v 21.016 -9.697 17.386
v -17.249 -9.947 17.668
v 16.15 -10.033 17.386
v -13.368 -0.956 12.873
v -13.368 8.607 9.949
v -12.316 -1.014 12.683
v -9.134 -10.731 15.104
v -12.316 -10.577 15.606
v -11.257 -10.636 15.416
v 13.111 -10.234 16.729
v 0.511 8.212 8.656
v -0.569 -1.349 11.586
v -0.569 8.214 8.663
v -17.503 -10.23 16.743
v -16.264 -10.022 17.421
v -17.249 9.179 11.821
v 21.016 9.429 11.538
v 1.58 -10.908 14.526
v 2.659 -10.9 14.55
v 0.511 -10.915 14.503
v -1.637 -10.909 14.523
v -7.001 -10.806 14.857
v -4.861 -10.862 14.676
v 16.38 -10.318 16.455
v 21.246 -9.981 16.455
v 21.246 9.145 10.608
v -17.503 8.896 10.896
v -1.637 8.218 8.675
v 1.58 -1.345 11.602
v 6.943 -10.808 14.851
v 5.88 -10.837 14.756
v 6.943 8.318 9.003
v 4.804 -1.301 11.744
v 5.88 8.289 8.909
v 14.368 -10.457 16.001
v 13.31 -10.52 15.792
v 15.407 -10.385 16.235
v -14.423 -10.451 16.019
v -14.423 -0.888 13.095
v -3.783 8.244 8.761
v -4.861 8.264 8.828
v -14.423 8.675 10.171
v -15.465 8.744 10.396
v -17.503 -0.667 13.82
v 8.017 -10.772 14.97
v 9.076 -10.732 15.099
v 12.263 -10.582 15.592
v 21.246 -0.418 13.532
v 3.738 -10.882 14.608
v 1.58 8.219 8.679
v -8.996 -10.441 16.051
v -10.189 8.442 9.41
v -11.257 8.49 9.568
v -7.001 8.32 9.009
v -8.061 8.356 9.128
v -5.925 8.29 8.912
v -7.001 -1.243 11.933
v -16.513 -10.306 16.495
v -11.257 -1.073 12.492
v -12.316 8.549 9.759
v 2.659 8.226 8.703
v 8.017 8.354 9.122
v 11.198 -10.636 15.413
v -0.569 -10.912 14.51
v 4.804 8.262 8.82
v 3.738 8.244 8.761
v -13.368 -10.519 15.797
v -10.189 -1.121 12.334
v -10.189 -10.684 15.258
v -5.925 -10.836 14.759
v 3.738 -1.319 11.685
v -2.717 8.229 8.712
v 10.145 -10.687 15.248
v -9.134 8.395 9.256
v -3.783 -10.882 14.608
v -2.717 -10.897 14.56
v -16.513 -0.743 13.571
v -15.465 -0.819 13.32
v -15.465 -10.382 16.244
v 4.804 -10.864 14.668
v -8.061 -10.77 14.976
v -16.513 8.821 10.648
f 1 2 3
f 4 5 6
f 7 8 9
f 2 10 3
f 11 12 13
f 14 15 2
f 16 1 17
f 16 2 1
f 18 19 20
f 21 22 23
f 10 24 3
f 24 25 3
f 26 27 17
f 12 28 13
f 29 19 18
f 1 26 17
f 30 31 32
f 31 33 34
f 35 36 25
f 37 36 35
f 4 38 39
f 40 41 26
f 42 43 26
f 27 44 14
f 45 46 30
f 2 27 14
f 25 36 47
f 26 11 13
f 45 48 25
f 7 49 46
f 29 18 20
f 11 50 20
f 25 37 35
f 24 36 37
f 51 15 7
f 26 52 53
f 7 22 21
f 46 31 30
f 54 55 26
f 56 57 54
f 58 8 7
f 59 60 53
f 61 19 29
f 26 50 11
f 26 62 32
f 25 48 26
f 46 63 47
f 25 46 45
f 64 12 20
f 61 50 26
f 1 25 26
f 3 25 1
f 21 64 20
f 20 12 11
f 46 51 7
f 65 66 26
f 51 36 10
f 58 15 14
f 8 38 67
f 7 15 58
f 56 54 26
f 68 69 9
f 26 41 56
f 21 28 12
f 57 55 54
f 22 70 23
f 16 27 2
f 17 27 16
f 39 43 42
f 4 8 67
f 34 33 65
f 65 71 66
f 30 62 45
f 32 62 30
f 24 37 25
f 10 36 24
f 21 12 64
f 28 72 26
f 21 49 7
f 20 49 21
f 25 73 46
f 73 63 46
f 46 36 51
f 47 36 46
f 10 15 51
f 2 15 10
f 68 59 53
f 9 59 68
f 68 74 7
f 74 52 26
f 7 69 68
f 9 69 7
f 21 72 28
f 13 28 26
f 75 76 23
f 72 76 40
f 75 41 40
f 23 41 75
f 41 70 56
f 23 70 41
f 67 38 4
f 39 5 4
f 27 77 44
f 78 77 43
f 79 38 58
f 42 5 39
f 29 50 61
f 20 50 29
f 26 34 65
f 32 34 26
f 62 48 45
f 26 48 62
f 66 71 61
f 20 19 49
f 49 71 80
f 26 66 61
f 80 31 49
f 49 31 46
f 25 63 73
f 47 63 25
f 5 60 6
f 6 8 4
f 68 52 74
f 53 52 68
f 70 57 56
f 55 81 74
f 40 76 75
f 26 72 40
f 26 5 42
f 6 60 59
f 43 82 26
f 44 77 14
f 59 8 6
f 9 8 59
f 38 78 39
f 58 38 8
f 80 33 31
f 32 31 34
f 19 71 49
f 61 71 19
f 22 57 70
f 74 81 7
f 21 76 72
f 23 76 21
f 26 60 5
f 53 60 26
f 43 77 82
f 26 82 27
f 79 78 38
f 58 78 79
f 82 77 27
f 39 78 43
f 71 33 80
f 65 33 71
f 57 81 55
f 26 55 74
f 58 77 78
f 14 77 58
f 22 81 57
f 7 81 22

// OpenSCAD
hull() {
	polyhedron(points = [[21.015921990298082278, -9.6968661252791008565, 17.385898562432661407], [21.015921990298082278, 9.4292289939816065214, 11.538464467977924244], [21.245998787904895266, 9.1447008983105675384, 10.607815001220002316], [21.245998787904895266, -0.41834666131978626158, 13.531532048447369121], [21.245998787904895266, -9.9813942209501398395, 16.455249095674737703], [16.150059612458484537, -10.033205852946363024, 17.385898562432661407], [16.150059612458484537, 9.0928892663143443542, 11.538464467977924244], [16.380136410065297525, 8.8083611706433053712, 10.607815001220002316], [16.380136410065297525, -0.75468638898704798468, 13.531532048447369121], [16.380136410065297525, -10.317733948617402007, 16.455249095674737703], [15.17688713689056712, -10.100473798479814747, 17.165875026644524581], [15.17688713689056712, 9.0256213207808926313, 11.318440932189787418], [15.406963934497380109, 8.7410932251098536483, 10.38779146543186549], [15.406963934497380109, -0.82195433452049937451, 13.311508512659232295], [15.406963934497380109, -10.38500189415085373, 16.235225559886600877], [14.152135476691794835, -10.17119106380654614, 16.934569274178546294], [14.152135476691794835, 8.954904055454161238, 11.087135179723812684], [14.367990727181227939, 8.6694249043464353122, 10.153374950800477805], [14.367990727181227939, -0.89362265528391870983, 13.077091998027846387], [14.367990727181227939, -10.456670214914272066, 16.000809045255213192], [13.110820024653460081, -10.233961476664669377, 16.729256504918232906], [13.110820024653460081, 8.8921336425960380012, 10.881822410463495743], [13.309600712109528331, 8.6055965081559246954, 9.9446016739871083701], [13.309600712109528331, -0.95745105147442877147, 12.868318721214476952], [13.309600712109528331, -10.520498611104782682, 15.792035768441845534], [12.078282570414469177, -10.294222837947037519, 16.532150473574372285], [12.078282570414469177, 8.8318722813136698591, 10.684716379119635121], [12.262745467026753943, 8.5445178276236166681, 9.7448223118344454718], [12.262745467026753943, -1.0185297320067365767, 12.668539359061812277], [12.262745467026753943, -10.58157729163709071, 15.592256406289180859], [11.031163105767490151, -10.348029755406946251, 16.356155976708063093], [11.031163105767490151, 8.7780653638537611272, 10.508721882253327706], [11.198443837973723447, 8.4898133798050405829, 9.5658921254443249893], [11.198443837973723447, -1.0732341798253119958, 12.489609172671691795], [11.198443837973723447, -10.636281739455666795, 15.413326219899060376], [9.9920867282612331195, -10.397762464907449598, 16.193487613614035325], [9.9920867282612331195, 8.7283326543532577801, 10.346053519159298162], [10.144967804693861169, 8.4393978978853763095, 9.4009905143952519069], [10.144967804693861169, -1.1236496617449773794, 12.324707561622618712], [10.144967804693861169, -10.686697221375331068, 15.248424608849987294], [8.9400347163076823165, -10.442561786292975157, 16.046955635953878527], [8.9400347163076823165, 8.6835333329677322212, 10.199521541499144917], [9.0756439452541037838, 8.3938624405481636614, 9.2520507445299653426], [9.0756439452541037838, -1.1691851190821893614, 12.175767791757333924], [9.0756439452541037838, -10.732232678712543716, 15.09948483898470073], [7.8956741722639147696, -10.481705796269976005, 15.918921348422623296], [7.8956741722639147696, 8.6443893229907313724, 10.071487253967887909], [8.0168163367886453585, 8.3541708868691326728, 9.1222255222471790859], [8.0168163367886453585, -1.2088766727612223484, 12.045942569474547668], [8.0168163367886453585, -10.771924232391574705, 14.969659616701914473], [6.839564786514664263, -10.51746028460065574, 15.801973686643666639], [6.839564786514664263, 8.6086348346600516379, 9.9545395921889312518], [6.9433634354009168277, 8.3178424250433771192, 9.0034004777589125013], [6.9433634354009168277, -1.2452051345869770138, 11.927117524986281083], [6.9433634354009168277, -10.808252694217330259, 14.850834572213647888], [5.7911812064893624097, -10.545968319665455226, 15.708728105504132344], [5.7911812064893624097, 8.5801267995952521517, 9.861294011049396957], [5.8804599030361934808, 8.2889226275126546284, 8.9088080822795312486], [5.8804599030361934808, -1.2741249321176979503, 11.83252512950689983], [5.8804599030361934808, -10.837172491748052749, 14.756242176734266636], [4.7318927519149163174, -10.572647626142034127, 15.621464026055862817], [4.7318927519149163174, 8.5534474931186732505, 9.77402993160112743], [4.8037743563616075448, 8.2618321038161273151, 8.8201989719106297372], [4.8037743563616075448, -1.3012154558142254857, 11.743916019137996543], [4.8037743563616075448, -10.864263015444580063, 14.667633066365365124], [3.6807521204854736219, -10.590485240237288878, 15.563119819284901624], [3.6807521204854736219, 8.5356098790234185003, 9.7156857248301662366], [3.7380754567641063524, 8.2437189311402967462, 8.7609534536348423472], [3.7380754567641063524, -1.3193286284900567207, 11.684670500862209153], [3.7380754567641063524, -10.882376188120410632, 14.608387548089577734], [2.6191654551378640292, -10.608065925320802947, 15.505615989444741842], [2.6191654551378640292, 8.518029193939904431, 9.6581818949900064553], [2.659056271348898548, 8.2258902040489321195, 8.7026383149438082398], [2.659056271348898548, -1.3371573555814209033, 11.626355362171176822], [2.659056271348898548, -10.900204915211775258, 14.550072409398543627], [1.5571301313920737908, -10.615277603175528043, 15.482027654049947074], [1.5571301313920737908, 8.5108175160851793351, 9.634593559595211687], [1.5798452641030620303, 8.2185212496694965978, 8.6785355512163384617], [1.5798452641030620303, -1.3445263099608570911, 11.602252598443705267], [1.5798452641030620303, -10.90757386959121078, 14.525969645671073849], [0.5035077216434232783, -10.622159719563320834, 15.459517265642222839], [0.5035077216434232783, 8.5039353996973865435, 9.6120831711874892278], [0.5113668014119475691, 8.2115727243029539295, 8.6558079488265811108], [0.5113668014119475691, -1.3514748353273995374, 11.579524996053947916], [0.5113668014119475691, -10.914522394957753448, 14.503242043281314722], [-0.55969246949480999653, -10.620097256783905593, 15.466263277424799227], [-0.55969246949480999653, 8.5059978624768017852, 9.6188291829700638402], [-0.56928712712562057341, 8.2136396155613287107, 8.6625684455111535698], [-0.56928712712562057341, -1.3494079440690252003, 11.586285492738520375], [-0.56928712712562057341, -10.912455503699378667, 14.510002539965888957], [-1.6125195715995086498, -10.616272236324949318, 15.478774355608731383], [-1.6125195715995086498, 8.5098228829357580594, 9.6313402611539977727], [-1.6367003391161654147, 8.2175366669705987022, 8.6753151263175354302], [-1.6367003391161654147, -1.3455108926597549868, 11.599032173544902236], [-1.6367003391161654147, -10.908558452290108676, 14.522749220772269041], [-2.6750035922459902693, -10.605089410934800398, 15.515351729318147989], [-2.6750035922459902693, 8.5210057083259069799, 9.6679176348634126015], [-2.7166291222015424012, 8.2288874074141755699, 8.7124417254191364179], [-2.7166291222015424012, -1.334160152216178119, 11.636158772646505], [-2.7166291222015424012, -10.897207711846531808, 14.559875819873871805], [-3.7267390106727740218, -10.590568334550255258, 15.562848030033741509], [-3.7267390106727740218, 8.5355267847104521195, 9.7154139355790061217], [-3.7829348904509538798, 8.2436170965810333655, 8.7606203678000085233], [-3.7829348904509538798, -1.3194304630493196573, 11.684337415027377105], [-3.7829348904509538798, -10.882478022679674012, 14.60805446225474391], [-4.7876230981018181865, -10.570275178726245002, 15.629223951898024936], [-4.7876230981018181865, 8.5558199405344623756, 9.7817898574432895487], [-4.8612365692795815875, 8.2642414847358942609, 8.828079701800975343], [-4.8612365692795815875, -1.2988060748944600942, 11.751796749028343925], [-4.8612365692795815875, -10.861853634524813117, 14.67551379625571073], [-5.8369967953404051642, -10.545075590745145888, 15.711648090230719177], [-5.8369967953404051642, 8.5810195285155614897, 9.8642139957759837898], [-5.9251502312697619246, 8.2897860538008281139, 8.9116322224150632536], [-5.9251502312697619246, -1.2732615058295262411, 11.835349269642431835], [-5.9251502312697619246, -10.836309065459879264, 14.759066316869798641], [-6.895398463720493254, -10.515689075464781155, 15.807767050683622756], [-6.895398463720493254, 8.6104060437959262231, 9.9603329562288873689], [-7.0009241527878049993, 8.3196667739247160966, 9.0093676540744773718], [-7.0009241527878049993, -1.2433807857056371482, 11.933084701301844177], [-7.0009241527878049993, -10.806428345335991281, 14.856801748529212759], [-7.9411432512251920457, -10.47984140089607763, 15.925019510913235976], [-7.9411432512251920457, 8.6462537183646297478, 10.077585416458500589], [-8.0611639241462889061, 8.355995453894500713, 9.1281934120797192378], [-8.0611639241462889061, -1.2070521057358516437, 12.05191045930708782], [-8.0611639241462889061, -10.770099665366206665, 14.975627506534454625], [-8.9961818731247724656, -10.441385424593725872, 16.050803341698156146], [-8.9961818731247724656, 8.6847096946669815054, 10.203369247243418982], [-9.1335113425972984658, 8.3951080877002439706, 9.2561250727790511661], [-9.1335113425972984658, -1.1679394719301097183, 12.179842120006419748], [-9.1335113425972984658, -10.730987031560463407, 15.103559167233786553], [-10.037034938423907704, -10.394932932465536624, 16.202742597210743725], [-10.037034938423907704, 8.7311621867951707543, 10.355308502756006561], [-10.188799857367065727, 8.4421771354154273581, 9.4100809907477991345], [-10.188799857367065727, -1.120870424214927441, 12.33379803797516594], [-10.188799857367065727, -10.68391798384528002, 15.257515085202534522], [-11.087832325460665217, -10.347438306258311513, 16.358090519704578725], [-11.087832325460665217, 8.7786568130023958645, 10.510656425249845114], [-11.25682453492664159, 8.4904901774226715361, 9.5681058307041340072], [-11.25682453492664159, -1.0725573822076825969, 12.491822877931500813], [-11.25682453492664159, -10.635604941838035842, 15.415539925158867618], [-12.130826484007744881, -10.28998208592428476, 16.546021348432333298], [-12.130826484007744881, 8.8361130333364226175, 10.698587253977599687], [-12.316465776491348549, 8.5488233456115647613, 9.7589050266192529648], [-12.316465776491348549, -1.0142242140187893717, 12.68262207384661977], [-12.316465776491348549, -10.577271773649142617, 15.606339121073986576], [-13.167274479509028851, -10.232609601207819594, 16.733678290296118973], [-13.167274479509028851, 8.8934855180528877838, 10.886244195841383586], [-13.36775592988668393, 8.6070496903803430655, 9.9493548188709652891], [-13.36775592988668393, -0.9559978692500109565, 12.873071866098332094], [-13.36775592988668393, -10.519045428880364312, 15.796788913325700676], [-14.205661711313787521, -10.165804085335658158, 16.952189286815759317], [-14.205661711313787521, 8.96029103392504922, 11.104755192361025706], [-14.423211305781006075, 8.6749218454890240082, 10.171354635130359867], [-14.423211305781006075, -0.88812571414133034686, 13.095071682357726672], [-14.423211305781006075, -10.45117327377168337, 16.018788729585093478], [-15.232758954180525279, -10.098059861404790283, 17.173770659047207232], [-15.232758954180525279, 9.0280352578559170951, 11.326336564592470069], [-15.464523864863501501, 8.7436243006743357142, 10.396070240569519783], [-15.464523864863501501, -0.81942325895601786367, 13.319787287796886588], [-15.464523864863501501, -10.382470818586371664, 16.24350433502425517], [-16.263941232543412951, -10.022378056180794914, 17.421314689835732281], [-16.263941232543412951, 9.1037170630799124638, 11.573880595380996894], [-16.512649129623643063, 8.8205321051208152028, 10.647624334125161738], [-16.512649129623643063, -0.74251545450953948535, 13.571341381352528543], [-16.512649129623643063, -10.305563014139892175, 16.495058428579895349], [-17.249434174697078959, -9.946811825017595865, 17.668480694904857842], [-17.249434174697078959, 9.1792832942431115129, 11.821046600450122455], [-17.503165223042536525, 8.8964795095546467252, 10.896037100784631946], [-17.503165223042536525, -0.66656805007570774091, 13.819754148011998751], [-17.503165223042536525, -10.229615609706060653, 16.743471195239365557]], faces = [[0, 1, 6, 5], [1, 2, 7, 6], [2, 3, 8, 7], [3, 4, 9, 8], [4, 0, 5, 9], [5, 6, 11, 10], [6, 7, 12, 11], [7, 8, 13, 12], [8, 9, 14, 13], [9, 5, 10, 14], [10, 11, 16, 15], [11, 12, 17, 16], [12, 13, 18, 17], [13, 14, 19, 18], [14, 10, 15, 19], [15, 16, 21, 20], [16, 17, 22, 21], [17, 18, 23, 22], [18, 19, 24, 23], [19, 15, 20, 24], [20, 21, 26, 25], [21, 22, 27, 26], [22, 23, 28, 27], [23, 24, 29, 28], [24, 20, 25, 29], [25, 26, 31, 30], [26, 27, 32, 31], [27, 28, 33, 32], [28, 29, 34, 33], [29, 25, 30, 34], [30, 31, 36, 35], [31, 32, 37, 36], [32, 33, 38, 37], [33, 34, 39, 38], [34, 30, 35, 39], [35, 36, 41, 40], [36, 37, 42, 41], [37, 38, 43, 42], [38, 39, 44, 43], [39, 35, 40, 44], [40, 41, 46, 45], [41, 42, 47, 46], [42, 43, 48, 47], [43, 44, 49, 48], [44, 40, 45, 49], [45, 46, 51, 50], [46, 47, 52, 51], [47, 48, 53, 52], [48, 49, 54, 53], [49, 45, 50, 54], [50, 51, 56, 55], [51, 52, 57, 56], [52, 53, 58, 57], [53, 54, 59, 58], [54, 50, 55, 59], [55, 56, 61, 60], [56, 57, 62, 61], [57, 58, 63, 62], [58, 59, 64, 63], [59, 55, 60, 64], [60, 61, 66, 65], [61, 62, 67, 66], [62, 63, 68, 67], [63, 64, 69, 68], [64, 60, 65, 69], [65, 66, 71, 70], [66, 67, 72, 71], [67, 68, 73, 72], [68, 69, 74, 73], [69, 65, 70, 74], [70, 71, 76, 75], [71, 72, 77, 76], [72, 73, 78, 77], [73, 74, 79, 78], [74, 70, 75, 79], [75, 76, 81, 80], [76, 77, 82, 81], [77, 78, 83, 82], [78, 79, 84, 83], [79, 75, 80, 84], [80, 81, 86, 85], [81, 82, 87, 86], [82, 83, 88, 87], [83, 84, 89, 88], [84, 80, 85, 89], [85, 86, 91, 90], [86, 87, 92, 91], [87, 88, 93, 92], [88, 89, 94, 93], [89, 85, 90, 94], [90, 91, 96, 95], [91, 92, 97, 96], [92, 93, 98, 97], [93, 94, 99, 98], [94, 90, 95, 99], [95, 96, 101, 100], [96, 97, 102, 101], [97, 98, 103, 102], [98, 99, 104, 103], [99, 95, 100, 104], [100, 101, 106, 105], [101, 102, 107, 106], [102, 103, 108, 107], [103, 104, 109, 108], [104, 100, 105, 109], [105, 106, 111, 110], [106, 107, 112, 111], [107, 108, 113, 112], [108, 109, 114, 113], [109, 105, 110, 114], [110, 111, 116, 115], [111, 112, 117, 116], [112, 113, 118, 117], [113, 114, 119, 118], [114, 110, 115, 119], [115, 116, 121, 120], [116, 117, 122, 121], [117, 118, 123, 122], [118, 119, 124, 123], [119, 115, 120, 124], [120, 121, 126, 125], [121, 122, 127, 126], [122, 123, 128, 127], [123, 124, 129, 128], [124, 120, 125, 129], [125, 126, 131, 130], [126, 127, 132, 131], [127, 128, 133, 132], [128, 129, 134, 133], [129, 125, 130, 134], [130, 131, 136, 135], [131, 132, 137, 136], [132, 133, 138, 137], [133, 134, 139, 138], [134, 130, 135, 139], [135, 136, 141, 140], [136, 137, 142, 141], [137, 138, 143, 142], [138, 139, 144, 143], [139, 135, 140, 144], [140, 141, 146, 145], [141, 142, 147, 146], [142, 143, 148, 147], [143, 144, 149, 148], [144, 140, 145, 149], [145, 146, 151, 150], [146, 147, 152, 151], [147, 148, 153, 152], [148, 149, 154, 153], [149, 145, 150, 154], [150, 151, 156, 155], [151, 152, 157, 156], [152, 153, 158, 157], [153, 154, 159, 158], [154, 150, 155, 159], [155, 156, 161, 160], [156, 157, 162, 161], [157, 158, 163, 162], [158, 159, 164, 163], [159, 155, 160, 164], [160, 161, 166, 165], [161, 162, 167, 166], [162, 163, 168, 167], [163, 164, 169, 168], [164, 160, 165, 169], [4, 3, 2, 1, 0], [165, 166, 167, 168, 169]], convexity = 5);
}
